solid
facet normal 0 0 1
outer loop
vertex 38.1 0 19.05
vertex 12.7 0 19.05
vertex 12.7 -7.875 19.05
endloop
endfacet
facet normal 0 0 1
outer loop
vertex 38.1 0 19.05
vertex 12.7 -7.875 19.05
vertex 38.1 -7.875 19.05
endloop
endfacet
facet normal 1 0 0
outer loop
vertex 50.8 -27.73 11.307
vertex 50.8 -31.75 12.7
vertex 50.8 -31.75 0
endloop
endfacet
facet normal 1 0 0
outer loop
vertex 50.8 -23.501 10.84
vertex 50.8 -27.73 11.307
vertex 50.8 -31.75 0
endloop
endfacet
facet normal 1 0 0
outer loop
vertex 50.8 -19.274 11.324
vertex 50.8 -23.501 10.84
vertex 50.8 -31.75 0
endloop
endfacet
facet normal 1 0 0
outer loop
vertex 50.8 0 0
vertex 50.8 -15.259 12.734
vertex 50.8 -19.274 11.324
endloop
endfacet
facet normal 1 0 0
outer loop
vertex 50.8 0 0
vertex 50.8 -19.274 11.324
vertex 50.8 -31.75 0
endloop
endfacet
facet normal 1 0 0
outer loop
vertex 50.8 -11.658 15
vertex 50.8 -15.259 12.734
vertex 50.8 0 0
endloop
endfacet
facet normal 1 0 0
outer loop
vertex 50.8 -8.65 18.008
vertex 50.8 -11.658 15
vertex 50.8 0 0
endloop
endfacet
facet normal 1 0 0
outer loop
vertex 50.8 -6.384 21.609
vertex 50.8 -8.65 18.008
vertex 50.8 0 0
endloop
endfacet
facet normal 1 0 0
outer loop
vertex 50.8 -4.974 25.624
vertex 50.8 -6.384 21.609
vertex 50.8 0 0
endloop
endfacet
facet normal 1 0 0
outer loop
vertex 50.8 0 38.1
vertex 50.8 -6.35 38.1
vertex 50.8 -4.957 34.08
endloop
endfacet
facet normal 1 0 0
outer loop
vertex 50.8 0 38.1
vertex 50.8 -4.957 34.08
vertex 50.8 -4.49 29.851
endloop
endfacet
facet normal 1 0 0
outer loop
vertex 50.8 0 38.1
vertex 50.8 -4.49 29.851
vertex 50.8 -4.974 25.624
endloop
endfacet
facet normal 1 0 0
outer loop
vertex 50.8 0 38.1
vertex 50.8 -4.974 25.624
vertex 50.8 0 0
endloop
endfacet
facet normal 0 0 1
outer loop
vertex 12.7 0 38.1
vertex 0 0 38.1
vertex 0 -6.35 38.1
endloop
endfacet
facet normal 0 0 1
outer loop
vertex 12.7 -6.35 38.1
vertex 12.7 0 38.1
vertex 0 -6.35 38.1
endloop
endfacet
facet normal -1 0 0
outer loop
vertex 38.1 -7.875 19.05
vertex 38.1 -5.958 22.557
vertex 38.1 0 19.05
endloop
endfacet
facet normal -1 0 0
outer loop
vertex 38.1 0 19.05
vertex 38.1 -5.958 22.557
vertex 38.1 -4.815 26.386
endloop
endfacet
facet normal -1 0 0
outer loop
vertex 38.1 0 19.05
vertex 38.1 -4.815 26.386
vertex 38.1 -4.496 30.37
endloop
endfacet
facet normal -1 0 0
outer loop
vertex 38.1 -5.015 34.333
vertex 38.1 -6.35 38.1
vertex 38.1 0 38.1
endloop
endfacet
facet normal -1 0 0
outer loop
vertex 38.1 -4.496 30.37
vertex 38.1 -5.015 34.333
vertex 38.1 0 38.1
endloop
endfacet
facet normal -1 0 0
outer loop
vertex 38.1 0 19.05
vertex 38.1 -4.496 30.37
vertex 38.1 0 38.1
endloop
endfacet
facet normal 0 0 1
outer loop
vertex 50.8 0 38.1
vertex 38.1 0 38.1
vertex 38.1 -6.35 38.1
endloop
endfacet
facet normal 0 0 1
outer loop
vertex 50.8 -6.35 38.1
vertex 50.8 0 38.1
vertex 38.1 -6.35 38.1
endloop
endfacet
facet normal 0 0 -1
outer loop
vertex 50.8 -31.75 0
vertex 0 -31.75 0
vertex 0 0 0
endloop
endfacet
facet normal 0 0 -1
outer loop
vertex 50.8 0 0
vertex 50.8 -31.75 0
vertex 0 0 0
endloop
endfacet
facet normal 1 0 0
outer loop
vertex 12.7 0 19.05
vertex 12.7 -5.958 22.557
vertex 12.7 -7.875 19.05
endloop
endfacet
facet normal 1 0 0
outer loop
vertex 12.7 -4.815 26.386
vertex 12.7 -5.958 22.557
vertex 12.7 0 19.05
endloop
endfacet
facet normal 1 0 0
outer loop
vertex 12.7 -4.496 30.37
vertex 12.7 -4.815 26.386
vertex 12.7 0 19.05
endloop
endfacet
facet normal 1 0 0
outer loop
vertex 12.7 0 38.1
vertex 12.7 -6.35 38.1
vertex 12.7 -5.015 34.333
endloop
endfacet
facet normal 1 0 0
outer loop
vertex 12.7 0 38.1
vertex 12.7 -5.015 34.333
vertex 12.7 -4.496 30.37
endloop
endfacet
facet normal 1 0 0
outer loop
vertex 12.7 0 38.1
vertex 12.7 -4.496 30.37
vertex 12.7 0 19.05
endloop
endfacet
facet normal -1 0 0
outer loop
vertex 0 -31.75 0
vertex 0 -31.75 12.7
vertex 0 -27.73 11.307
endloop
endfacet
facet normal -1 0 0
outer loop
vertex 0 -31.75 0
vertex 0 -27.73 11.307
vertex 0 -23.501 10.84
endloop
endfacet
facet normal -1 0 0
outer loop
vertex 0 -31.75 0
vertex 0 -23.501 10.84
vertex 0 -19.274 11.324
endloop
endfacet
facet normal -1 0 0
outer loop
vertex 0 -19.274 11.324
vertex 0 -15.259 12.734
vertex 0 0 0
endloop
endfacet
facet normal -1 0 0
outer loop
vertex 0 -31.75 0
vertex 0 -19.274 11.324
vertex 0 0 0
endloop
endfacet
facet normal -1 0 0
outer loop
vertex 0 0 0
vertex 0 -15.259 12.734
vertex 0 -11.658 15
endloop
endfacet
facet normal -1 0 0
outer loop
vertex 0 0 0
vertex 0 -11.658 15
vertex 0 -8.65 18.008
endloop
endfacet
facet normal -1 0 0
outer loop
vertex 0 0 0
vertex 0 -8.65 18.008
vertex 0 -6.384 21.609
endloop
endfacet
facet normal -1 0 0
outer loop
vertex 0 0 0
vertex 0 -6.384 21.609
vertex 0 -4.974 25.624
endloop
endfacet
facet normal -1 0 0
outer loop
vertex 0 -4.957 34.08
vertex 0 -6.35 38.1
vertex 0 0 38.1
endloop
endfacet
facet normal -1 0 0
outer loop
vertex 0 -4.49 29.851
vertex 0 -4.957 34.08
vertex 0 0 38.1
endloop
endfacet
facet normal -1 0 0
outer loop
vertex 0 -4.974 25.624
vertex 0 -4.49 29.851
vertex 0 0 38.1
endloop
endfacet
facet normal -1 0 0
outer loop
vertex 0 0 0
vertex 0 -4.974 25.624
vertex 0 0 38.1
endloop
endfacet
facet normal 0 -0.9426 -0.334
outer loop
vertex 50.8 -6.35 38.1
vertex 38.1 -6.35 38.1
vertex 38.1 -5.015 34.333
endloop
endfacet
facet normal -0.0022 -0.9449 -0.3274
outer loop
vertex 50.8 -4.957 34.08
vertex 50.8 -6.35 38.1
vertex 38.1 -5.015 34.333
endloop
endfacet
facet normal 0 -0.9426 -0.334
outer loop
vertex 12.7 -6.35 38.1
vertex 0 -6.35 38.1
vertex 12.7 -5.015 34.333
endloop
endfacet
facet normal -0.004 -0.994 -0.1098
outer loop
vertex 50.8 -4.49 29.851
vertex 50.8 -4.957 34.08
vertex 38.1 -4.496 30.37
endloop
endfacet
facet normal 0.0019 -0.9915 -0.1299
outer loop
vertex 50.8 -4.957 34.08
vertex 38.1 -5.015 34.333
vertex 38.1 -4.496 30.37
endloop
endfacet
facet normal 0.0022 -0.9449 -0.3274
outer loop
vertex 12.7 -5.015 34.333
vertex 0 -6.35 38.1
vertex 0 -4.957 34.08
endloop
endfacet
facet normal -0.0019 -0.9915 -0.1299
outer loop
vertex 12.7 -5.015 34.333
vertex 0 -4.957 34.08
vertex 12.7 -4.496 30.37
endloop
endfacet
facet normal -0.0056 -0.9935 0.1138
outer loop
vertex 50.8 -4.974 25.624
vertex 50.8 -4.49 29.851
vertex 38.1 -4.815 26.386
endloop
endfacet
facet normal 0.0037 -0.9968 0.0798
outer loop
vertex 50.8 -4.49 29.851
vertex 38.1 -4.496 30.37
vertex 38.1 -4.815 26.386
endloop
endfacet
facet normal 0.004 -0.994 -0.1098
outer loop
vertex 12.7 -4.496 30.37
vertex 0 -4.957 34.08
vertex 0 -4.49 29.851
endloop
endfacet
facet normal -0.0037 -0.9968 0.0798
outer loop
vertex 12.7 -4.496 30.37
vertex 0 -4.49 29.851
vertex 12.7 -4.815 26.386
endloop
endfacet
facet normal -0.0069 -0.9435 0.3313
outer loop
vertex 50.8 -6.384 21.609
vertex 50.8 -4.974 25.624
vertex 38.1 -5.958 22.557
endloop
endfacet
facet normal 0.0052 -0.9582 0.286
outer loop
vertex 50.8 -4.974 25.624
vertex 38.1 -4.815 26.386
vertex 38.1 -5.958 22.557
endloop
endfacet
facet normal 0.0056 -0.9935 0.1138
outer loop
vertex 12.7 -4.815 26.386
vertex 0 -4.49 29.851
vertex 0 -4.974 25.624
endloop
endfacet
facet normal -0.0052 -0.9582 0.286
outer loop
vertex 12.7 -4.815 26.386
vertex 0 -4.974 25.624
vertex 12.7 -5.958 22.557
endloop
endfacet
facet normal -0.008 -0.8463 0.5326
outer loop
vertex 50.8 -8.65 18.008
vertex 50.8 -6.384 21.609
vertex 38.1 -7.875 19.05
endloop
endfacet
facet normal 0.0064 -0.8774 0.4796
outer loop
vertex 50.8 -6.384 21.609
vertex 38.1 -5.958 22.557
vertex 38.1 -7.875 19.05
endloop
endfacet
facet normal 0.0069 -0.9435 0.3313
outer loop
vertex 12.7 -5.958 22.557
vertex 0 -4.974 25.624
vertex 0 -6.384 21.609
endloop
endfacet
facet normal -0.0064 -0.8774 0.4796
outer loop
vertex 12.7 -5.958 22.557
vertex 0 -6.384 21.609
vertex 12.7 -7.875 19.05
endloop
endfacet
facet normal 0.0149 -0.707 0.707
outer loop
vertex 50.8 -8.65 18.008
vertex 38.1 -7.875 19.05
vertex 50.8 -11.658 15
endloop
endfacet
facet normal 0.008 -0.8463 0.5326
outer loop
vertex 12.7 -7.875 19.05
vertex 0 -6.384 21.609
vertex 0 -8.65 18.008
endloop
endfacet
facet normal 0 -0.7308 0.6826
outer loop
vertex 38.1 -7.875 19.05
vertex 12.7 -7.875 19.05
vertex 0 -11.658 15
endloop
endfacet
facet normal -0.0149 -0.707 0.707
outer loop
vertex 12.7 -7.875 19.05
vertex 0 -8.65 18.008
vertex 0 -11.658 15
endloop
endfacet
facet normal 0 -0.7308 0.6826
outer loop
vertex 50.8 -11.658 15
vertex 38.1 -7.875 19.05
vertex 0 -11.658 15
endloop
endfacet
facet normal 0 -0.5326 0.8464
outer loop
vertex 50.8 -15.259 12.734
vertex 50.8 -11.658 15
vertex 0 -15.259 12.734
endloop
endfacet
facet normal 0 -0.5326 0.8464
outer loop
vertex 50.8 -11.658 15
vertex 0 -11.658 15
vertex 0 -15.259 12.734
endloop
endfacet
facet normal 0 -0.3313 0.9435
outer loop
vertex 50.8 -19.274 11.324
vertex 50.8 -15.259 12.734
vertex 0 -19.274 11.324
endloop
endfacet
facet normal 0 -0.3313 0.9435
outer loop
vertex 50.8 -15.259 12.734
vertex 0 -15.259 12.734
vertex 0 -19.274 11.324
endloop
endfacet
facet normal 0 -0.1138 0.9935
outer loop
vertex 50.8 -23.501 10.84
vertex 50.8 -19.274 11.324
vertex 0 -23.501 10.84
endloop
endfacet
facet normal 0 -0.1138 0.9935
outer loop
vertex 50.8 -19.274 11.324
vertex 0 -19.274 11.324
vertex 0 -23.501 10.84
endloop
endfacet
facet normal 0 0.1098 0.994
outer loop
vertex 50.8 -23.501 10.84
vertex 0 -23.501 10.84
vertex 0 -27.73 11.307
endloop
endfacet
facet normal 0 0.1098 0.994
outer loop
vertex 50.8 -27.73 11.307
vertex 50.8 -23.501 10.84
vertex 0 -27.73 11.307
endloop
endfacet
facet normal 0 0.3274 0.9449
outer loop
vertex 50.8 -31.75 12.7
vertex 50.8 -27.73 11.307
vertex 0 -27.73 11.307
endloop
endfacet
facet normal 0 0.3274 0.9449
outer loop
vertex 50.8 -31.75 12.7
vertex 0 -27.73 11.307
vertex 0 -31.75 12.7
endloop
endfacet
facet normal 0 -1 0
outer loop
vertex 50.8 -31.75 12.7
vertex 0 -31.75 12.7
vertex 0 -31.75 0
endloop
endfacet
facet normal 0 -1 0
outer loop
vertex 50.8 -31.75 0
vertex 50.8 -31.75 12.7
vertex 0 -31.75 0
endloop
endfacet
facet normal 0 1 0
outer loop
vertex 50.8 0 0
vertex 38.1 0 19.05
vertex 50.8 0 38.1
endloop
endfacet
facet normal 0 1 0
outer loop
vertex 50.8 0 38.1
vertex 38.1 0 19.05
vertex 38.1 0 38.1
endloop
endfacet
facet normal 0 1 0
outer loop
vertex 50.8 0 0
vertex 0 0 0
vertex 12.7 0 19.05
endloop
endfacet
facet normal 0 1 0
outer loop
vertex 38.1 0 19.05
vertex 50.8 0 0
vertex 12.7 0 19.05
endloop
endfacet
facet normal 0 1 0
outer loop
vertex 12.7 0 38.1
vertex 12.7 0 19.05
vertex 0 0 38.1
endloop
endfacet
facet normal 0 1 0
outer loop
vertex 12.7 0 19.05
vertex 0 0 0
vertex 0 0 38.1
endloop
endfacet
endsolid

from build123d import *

# Parameters (mm, degrees)
F1_DEPTH = 50.8
F2_W     = 25.4
F2_H     = 15.875
F3_DEPTH = 19.05


with BuildPart() as f1:
    # F0 (on Right) → F1 (new body)
    with BuildSketch(Plane.YZ):
        with BuildLine():
            Line((0, 0), (0, 38.1))
            Line((0, 38.1), (-6.35, 38.1))
            ThreePointArc((-6.35, 38.1), (-10.069744, 16.419744), (-31.75, 12.7))
            Line((-31.75, 12.7), (-31.75, 0))
            Line((-31.75, 0), (0, 0))
        make_face()
    extrude(amount=F1_DEPTH)

    # F2 (on face) → F3 (cut)
    with BuildSketch(Plane.XY.offset(38.1)):
        with Locations((25.4, -7.9375)):
            Rectangle(F2_W, F2_H)
    extrude(amount=-F3_DEPTH, mode=Mode.SUBTRACT)


solid = f1.part
